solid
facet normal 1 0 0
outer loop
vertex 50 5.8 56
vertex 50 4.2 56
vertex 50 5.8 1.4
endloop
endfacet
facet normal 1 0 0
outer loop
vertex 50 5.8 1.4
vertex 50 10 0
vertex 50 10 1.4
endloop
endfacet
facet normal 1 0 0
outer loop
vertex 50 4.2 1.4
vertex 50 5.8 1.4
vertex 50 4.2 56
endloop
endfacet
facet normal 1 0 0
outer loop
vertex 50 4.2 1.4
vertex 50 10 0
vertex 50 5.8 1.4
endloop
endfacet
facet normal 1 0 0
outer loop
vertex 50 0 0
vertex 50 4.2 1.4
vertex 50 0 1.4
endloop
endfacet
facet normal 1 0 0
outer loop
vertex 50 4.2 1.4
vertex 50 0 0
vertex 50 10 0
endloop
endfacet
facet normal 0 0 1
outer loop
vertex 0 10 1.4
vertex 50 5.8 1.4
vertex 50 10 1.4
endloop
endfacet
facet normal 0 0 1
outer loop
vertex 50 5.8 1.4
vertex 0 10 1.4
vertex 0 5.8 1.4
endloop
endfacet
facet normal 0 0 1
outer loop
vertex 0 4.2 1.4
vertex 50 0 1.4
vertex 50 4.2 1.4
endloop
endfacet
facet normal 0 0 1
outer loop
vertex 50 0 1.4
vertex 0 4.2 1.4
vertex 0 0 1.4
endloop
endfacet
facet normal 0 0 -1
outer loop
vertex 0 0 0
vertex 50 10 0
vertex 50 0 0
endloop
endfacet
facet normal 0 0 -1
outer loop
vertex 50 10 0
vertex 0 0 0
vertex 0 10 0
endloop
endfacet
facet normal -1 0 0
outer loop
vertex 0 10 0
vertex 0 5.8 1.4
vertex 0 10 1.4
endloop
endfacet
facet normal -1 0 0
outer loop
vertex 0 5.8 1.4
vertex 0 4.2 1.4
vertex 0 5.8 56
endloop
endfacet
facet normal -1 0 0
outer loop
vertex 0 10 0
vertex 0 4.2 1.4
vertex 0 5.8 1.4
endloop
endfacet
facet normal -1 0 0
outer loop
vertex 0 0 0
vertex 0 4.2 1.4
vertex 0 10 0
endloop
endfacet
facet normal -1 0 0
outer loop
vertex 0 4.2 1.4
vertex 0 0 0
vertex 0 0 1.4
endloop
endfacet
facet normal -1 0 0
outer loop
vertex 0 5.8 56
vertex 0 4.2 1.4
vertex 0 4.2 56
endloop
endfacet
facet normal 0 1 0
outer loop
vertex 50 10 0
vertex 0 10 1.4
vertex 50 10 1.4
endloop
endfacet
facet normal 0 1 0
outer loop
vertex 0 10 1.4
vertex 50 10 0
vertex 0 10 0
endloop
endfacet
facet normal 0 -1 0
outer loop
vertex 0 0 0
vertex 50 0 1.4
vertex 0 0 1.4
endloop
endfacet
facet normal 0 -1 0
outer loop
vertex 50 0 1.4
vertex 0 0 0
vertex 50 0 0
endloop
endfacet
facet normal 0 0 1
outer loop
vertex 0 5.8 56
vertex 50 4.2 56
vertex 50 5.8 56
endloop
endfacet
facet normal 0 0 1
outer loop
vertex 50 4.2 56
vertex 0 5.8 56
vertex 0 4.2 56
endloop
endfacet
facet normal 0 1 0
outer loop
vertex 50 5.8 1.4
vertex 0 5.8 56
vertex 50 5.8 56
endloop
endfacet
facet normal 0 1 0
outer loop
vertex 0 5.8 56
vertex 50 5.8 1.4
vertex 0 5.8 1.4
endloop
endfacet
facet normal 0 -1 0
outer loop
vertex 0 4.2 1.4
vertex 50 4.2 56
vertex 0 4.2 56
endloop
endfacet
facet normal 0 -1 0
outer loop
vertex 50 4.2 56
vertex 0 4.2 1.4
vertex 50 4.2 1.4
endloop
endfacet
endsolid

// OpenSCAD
$fa=4; // default minimum facet angle is now 4
$fs=0.05; // default minimum facet size is now 0.05 mm

cube([50, 10, 1.4]);
translate([0, 4.2, 0]) cube([50, 1.6, 56]);
